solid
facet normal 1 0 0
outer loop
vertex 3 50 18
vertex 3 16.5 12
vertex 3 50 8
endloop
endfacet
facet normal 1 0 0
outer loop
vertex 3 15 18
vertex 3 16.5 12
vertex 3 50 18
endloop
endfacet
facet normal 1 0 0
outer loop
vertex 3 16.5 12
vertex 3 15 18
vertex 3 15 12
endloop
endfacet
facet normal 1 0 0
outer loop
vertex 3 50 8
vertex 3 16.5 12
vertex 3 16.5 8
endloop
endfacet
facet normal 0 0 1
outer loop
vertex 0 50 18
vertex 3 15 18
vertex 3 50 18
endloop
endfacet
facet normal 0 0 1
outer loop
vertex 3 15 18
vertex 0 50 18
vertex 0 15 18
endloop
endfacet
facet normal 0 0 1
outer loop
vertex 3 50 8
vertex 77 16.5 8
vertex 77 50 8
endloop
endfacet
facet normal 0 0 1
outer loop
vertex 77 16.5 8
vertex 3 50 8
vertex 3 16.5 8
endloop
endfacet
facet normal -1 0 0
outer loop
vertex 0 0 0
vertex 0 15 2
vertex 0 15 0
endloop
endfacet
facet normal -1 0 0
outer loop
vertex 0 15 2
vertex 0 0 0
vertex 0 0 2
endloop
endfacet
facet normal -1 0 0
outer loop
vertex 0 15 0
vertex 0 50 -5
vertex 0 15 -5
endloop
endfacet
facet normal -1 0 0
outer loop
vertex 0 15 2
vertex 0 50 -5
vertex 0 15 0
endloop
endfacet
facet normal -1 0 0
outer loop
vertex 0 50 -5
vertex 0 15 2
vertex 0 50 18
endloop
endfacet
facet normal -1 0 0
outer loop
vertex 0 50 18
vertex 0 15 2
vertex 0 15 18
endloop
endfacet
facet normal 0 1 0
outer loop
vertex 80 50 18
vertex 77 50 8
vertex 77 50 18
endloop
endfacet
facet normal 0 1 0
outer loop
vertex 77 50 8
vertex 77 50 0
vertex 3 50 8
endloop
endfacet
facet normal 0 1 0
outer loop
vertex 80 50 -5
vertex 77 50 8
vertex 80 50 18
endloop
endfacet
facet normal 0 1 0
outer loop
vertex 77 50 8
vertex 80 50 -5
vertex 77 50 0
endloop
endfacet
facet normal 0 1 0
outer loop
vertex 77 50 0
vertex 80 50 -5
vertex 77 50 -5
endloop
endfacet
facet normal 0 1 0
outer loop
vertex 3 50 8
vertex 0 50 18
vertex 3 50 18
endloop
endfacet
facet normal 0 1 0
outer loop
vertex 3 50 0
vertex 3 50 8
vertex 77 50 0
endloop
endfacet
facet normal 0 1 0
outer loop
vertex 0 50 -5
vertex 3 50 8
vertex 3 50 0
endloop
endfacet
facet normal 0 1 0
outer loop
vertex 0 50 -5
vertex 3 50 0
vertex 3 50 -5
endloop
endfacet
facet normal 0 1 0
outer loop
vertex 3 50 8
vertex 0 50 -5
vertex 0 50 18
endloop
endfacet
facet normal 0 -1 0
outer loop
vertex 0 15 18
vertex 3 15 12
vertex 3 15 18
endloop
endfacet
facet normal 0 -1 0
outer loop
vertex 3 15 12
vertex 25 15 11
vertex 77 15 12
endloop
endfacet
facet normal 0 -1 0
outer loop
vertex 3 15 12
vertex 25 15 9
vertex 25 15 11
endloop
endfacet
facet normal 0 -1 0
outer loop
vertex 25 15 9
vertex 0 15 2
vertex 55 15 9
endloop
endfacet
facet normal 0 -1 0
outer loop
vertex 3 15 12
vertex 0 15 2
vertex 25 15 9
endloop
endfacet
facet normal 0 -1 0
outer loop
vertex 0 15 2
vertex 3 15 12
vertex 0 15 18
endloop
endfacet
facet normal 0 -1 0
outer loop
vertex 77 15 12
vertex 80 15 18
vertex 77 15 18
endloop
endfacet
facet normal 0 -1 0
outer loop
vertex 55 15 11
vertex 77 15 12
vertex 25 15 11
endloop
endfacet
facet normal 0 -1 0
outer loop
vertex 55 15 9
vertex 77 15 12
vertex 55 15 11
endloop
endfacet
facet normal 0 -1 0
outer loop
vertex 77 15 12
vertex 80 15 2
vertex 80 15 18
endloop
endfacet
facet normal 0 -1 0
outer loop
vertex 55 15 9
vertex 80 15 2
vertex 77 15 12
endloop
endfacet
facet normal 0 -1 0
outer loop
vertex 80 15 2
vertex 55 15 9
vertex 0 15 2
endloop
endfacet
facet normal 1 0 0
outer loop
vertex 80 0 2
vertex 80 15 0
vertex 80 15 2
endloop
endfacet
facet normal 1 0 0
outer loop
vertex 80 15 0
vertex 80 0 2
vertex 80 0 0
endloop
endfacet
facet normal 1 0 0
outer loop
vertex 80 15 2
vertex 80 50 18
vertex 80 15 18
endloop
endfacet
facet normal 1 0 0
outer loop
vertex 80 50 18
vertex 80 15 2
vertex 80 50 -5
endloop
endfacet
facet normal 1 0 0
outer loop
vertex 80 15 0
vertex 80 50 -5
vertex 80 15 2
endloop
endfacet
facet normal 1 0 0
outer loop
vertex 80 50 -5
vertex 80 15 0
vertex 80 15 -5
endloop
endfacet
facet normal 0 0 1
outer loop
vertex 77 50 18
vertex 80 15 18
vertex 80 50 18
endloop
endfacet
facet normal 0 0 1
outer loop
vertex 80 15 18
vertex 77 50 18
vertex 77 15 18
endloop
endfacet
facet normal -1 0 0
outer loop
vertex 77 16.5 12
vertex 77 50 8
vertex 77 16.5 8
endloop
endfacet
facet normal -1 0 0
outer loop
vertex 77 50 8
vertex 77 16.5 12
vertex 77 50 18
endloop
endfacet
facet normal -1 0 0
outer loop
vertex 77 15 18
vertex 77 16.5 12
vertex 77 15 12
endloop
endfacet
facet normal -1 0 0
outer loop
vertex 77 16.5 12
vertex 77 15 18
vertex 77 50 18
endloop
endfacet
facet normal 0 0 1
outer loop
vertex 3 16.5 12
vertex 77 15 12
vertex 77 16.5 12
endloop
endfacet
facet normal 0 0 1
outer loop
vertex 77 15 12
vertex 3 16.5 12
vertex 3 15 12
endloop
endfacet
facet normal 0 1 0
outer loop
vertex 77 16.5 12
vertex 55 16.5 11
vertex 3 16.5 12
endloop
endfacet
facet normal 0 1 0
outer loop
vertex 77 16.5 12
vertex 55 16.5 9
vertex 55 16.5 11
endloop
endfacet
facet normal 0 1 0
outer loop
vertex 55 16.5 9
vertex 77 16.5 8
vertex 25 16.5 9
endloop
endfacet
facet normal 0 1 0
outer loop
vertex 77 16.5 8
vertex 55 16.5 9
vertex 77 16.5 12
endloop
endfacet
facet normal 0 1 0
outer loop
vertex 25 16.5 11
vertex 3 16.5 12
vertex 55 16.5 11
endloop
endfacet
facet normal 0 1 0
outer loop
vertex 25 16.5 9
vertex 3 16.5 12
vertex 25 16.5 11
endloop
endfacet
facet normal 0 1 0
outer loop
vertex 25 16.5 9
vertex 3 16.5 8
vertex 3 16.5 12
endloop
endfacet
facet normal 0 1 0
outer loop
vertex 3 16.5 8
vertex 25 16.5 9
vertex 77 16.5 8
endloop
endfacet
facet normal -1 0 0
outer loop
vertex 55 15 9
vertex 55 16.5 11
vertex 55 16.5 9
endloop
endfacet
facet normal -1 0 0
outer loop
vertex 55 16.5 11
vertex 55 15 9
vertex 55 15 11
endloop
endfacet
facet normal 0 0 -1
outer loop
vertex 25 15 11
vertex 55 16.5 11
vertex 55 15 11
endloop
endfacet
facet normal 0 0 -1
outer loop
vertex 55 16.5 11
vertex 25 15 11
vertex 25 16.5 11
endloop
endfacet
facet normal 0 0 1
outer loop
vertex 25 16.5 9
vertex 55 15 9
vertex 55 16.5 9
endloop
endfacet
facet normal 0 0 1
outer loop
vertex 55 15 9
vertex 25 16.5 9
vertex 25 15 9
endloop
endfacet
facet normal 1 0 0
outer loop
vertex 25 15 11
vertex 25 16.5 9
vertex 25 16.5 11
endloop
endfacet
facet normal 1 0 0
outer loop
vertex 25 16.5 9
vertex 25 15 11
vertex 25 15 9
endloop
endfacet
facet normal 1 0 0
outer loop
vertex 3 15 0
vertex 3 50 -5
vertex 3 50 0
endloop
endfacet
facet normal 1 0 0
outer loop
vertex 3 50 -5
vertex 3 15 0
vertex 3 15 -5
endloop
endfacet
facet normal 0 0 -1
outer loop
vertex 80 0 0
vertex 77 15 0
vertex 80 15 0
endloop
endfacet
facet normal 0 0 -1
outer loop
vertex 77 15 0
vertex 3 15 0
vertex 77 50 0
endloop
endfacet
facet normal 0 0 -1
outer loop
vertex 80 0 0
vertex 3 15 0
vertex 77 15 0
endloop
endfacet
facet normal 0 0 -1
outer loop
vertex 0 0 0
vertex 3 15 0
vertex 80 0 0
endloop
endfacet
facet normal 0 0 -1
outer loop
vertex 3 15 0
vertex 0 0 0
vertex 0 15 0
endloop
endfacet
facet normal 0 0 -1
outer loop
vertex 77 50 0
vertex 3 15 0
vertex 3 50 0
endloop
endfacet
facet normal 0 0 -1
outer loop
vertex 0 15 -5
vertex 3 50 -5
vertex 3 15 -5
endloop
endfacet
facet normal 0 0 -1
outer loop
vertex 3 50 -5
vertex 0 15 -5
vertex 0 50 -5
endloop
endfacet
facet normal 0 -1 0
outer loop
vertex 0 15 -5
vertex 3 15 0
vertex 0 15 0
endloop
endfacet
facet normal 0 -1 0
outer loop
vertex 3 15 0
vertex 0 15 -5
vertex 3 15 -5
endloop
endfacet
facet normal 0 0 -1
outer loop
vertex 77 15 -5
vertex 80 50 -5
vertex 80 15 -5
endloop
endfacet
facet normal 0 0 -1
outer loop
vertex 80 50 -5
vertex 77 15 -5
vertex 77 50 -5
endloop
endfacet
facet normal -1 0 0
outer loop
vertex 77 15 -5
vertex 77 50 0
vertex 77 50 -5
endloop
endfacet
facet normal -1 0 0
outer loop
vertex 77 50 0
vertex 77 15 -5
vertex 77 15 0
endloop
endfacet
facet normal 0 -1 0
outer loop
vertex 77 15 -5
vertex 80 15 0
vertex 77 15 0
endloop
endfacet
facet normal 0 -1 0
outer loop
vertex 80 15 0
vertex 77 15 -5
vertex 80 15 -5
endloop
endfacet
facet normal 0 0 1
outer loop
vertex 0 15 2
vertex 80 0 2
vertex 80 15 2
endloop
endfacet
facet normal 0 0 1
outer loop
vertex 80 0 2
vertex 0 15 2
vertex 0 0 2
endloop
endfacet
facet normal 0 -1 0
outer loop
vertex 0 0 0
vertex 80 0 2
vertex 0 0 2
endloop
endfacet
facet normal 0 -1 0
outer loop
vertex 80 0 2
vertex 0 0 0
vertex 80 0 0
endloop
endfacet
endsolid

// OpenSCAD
// ========== Parameters ==========
base_w       = 80;            // total width (X)
base_d       = 50;            // total depth (Y)
base_t       = 2;             // base slab thickness
front_strip  = 15;            // exposed front strip depth
raised_d     = base_d - front_strip; // depth of rear raised area
raised_h     = 6;             // height of raised block above base
strip_w      = 3;             // width of side strips (X)
strip_h      = 10;            // height of side strips (above raised block)
t_wall_thick = 1.5;           // transverse wall thickness (Y)
t_wall_h     = 4;             // transverse wall height (Z, shallow)
slot_w       = 30;            // width of slot opening (X)
slot_h       = 2;             // height of slot opening (Z)
leg_h        = 5;             // downward leg height below base
leg_d        = raised_d;      // depth of legs (Y) – same as raised block
$fn          = 50;            // resolution for cylinders if needed

// ========== Modules ==========
// Thin transverse wall with a through-slot
module transverse_wall() {
    difference() {
        // main wall, sits on raised block front edge
        translate([0, front_strip, base_t + raised_h])
            cube([base_w, t_wall_thick, t_wall_h]);
        // slot cutout, slightly oversized in Y to guarantee full cut
        translate([(base_w - slot_w)/2,
                   front_strip - 0.1,
                   base_t + raised_h + (t_wall_h - slot_h)/2])
            cube([slot_w, t_wall_thick + 0.2, slot_h]);
    }
}

// ========== Main Assembly ==========
union() {
    // 1. Thin rectangular base slab
    color("lightblue")
        cube([base_w, base_d, base_t]);

    // 2. Raised rectangular portion (rear area)
    color("lightgreen")
        translate([0, front_strip, base_t])
            cube([base_w, raised_d, raised_h]);

    // 3. Narrow raised strips on left and right sides of the raised area
    color("orange")
    translate([0, front_strip, base_t + raised_h]) {
        cube([strip_w, raised_d, strip_h]);                  // left strip
        translate([base_w - strip_w, 0, 0])
            cube([strip_w, raised_d, strip_h]);              // right strip
    }

    // 4. Very thin transverse feature with internal opening
    color("red")
    transverse_wall();

    // 5. Downward legs (aligned continuation) making the underside non‑flat
    color("gray") {
        // left leg
        translate([0, front_strip, -leg_h])
            cube([strip_w, leg_d, leg_h]);
        // right leg
        translate([base_w - strip_w, front_strip, -leg_h])
            cube([strip_w, leg_d, leg_h]);
    }
}
